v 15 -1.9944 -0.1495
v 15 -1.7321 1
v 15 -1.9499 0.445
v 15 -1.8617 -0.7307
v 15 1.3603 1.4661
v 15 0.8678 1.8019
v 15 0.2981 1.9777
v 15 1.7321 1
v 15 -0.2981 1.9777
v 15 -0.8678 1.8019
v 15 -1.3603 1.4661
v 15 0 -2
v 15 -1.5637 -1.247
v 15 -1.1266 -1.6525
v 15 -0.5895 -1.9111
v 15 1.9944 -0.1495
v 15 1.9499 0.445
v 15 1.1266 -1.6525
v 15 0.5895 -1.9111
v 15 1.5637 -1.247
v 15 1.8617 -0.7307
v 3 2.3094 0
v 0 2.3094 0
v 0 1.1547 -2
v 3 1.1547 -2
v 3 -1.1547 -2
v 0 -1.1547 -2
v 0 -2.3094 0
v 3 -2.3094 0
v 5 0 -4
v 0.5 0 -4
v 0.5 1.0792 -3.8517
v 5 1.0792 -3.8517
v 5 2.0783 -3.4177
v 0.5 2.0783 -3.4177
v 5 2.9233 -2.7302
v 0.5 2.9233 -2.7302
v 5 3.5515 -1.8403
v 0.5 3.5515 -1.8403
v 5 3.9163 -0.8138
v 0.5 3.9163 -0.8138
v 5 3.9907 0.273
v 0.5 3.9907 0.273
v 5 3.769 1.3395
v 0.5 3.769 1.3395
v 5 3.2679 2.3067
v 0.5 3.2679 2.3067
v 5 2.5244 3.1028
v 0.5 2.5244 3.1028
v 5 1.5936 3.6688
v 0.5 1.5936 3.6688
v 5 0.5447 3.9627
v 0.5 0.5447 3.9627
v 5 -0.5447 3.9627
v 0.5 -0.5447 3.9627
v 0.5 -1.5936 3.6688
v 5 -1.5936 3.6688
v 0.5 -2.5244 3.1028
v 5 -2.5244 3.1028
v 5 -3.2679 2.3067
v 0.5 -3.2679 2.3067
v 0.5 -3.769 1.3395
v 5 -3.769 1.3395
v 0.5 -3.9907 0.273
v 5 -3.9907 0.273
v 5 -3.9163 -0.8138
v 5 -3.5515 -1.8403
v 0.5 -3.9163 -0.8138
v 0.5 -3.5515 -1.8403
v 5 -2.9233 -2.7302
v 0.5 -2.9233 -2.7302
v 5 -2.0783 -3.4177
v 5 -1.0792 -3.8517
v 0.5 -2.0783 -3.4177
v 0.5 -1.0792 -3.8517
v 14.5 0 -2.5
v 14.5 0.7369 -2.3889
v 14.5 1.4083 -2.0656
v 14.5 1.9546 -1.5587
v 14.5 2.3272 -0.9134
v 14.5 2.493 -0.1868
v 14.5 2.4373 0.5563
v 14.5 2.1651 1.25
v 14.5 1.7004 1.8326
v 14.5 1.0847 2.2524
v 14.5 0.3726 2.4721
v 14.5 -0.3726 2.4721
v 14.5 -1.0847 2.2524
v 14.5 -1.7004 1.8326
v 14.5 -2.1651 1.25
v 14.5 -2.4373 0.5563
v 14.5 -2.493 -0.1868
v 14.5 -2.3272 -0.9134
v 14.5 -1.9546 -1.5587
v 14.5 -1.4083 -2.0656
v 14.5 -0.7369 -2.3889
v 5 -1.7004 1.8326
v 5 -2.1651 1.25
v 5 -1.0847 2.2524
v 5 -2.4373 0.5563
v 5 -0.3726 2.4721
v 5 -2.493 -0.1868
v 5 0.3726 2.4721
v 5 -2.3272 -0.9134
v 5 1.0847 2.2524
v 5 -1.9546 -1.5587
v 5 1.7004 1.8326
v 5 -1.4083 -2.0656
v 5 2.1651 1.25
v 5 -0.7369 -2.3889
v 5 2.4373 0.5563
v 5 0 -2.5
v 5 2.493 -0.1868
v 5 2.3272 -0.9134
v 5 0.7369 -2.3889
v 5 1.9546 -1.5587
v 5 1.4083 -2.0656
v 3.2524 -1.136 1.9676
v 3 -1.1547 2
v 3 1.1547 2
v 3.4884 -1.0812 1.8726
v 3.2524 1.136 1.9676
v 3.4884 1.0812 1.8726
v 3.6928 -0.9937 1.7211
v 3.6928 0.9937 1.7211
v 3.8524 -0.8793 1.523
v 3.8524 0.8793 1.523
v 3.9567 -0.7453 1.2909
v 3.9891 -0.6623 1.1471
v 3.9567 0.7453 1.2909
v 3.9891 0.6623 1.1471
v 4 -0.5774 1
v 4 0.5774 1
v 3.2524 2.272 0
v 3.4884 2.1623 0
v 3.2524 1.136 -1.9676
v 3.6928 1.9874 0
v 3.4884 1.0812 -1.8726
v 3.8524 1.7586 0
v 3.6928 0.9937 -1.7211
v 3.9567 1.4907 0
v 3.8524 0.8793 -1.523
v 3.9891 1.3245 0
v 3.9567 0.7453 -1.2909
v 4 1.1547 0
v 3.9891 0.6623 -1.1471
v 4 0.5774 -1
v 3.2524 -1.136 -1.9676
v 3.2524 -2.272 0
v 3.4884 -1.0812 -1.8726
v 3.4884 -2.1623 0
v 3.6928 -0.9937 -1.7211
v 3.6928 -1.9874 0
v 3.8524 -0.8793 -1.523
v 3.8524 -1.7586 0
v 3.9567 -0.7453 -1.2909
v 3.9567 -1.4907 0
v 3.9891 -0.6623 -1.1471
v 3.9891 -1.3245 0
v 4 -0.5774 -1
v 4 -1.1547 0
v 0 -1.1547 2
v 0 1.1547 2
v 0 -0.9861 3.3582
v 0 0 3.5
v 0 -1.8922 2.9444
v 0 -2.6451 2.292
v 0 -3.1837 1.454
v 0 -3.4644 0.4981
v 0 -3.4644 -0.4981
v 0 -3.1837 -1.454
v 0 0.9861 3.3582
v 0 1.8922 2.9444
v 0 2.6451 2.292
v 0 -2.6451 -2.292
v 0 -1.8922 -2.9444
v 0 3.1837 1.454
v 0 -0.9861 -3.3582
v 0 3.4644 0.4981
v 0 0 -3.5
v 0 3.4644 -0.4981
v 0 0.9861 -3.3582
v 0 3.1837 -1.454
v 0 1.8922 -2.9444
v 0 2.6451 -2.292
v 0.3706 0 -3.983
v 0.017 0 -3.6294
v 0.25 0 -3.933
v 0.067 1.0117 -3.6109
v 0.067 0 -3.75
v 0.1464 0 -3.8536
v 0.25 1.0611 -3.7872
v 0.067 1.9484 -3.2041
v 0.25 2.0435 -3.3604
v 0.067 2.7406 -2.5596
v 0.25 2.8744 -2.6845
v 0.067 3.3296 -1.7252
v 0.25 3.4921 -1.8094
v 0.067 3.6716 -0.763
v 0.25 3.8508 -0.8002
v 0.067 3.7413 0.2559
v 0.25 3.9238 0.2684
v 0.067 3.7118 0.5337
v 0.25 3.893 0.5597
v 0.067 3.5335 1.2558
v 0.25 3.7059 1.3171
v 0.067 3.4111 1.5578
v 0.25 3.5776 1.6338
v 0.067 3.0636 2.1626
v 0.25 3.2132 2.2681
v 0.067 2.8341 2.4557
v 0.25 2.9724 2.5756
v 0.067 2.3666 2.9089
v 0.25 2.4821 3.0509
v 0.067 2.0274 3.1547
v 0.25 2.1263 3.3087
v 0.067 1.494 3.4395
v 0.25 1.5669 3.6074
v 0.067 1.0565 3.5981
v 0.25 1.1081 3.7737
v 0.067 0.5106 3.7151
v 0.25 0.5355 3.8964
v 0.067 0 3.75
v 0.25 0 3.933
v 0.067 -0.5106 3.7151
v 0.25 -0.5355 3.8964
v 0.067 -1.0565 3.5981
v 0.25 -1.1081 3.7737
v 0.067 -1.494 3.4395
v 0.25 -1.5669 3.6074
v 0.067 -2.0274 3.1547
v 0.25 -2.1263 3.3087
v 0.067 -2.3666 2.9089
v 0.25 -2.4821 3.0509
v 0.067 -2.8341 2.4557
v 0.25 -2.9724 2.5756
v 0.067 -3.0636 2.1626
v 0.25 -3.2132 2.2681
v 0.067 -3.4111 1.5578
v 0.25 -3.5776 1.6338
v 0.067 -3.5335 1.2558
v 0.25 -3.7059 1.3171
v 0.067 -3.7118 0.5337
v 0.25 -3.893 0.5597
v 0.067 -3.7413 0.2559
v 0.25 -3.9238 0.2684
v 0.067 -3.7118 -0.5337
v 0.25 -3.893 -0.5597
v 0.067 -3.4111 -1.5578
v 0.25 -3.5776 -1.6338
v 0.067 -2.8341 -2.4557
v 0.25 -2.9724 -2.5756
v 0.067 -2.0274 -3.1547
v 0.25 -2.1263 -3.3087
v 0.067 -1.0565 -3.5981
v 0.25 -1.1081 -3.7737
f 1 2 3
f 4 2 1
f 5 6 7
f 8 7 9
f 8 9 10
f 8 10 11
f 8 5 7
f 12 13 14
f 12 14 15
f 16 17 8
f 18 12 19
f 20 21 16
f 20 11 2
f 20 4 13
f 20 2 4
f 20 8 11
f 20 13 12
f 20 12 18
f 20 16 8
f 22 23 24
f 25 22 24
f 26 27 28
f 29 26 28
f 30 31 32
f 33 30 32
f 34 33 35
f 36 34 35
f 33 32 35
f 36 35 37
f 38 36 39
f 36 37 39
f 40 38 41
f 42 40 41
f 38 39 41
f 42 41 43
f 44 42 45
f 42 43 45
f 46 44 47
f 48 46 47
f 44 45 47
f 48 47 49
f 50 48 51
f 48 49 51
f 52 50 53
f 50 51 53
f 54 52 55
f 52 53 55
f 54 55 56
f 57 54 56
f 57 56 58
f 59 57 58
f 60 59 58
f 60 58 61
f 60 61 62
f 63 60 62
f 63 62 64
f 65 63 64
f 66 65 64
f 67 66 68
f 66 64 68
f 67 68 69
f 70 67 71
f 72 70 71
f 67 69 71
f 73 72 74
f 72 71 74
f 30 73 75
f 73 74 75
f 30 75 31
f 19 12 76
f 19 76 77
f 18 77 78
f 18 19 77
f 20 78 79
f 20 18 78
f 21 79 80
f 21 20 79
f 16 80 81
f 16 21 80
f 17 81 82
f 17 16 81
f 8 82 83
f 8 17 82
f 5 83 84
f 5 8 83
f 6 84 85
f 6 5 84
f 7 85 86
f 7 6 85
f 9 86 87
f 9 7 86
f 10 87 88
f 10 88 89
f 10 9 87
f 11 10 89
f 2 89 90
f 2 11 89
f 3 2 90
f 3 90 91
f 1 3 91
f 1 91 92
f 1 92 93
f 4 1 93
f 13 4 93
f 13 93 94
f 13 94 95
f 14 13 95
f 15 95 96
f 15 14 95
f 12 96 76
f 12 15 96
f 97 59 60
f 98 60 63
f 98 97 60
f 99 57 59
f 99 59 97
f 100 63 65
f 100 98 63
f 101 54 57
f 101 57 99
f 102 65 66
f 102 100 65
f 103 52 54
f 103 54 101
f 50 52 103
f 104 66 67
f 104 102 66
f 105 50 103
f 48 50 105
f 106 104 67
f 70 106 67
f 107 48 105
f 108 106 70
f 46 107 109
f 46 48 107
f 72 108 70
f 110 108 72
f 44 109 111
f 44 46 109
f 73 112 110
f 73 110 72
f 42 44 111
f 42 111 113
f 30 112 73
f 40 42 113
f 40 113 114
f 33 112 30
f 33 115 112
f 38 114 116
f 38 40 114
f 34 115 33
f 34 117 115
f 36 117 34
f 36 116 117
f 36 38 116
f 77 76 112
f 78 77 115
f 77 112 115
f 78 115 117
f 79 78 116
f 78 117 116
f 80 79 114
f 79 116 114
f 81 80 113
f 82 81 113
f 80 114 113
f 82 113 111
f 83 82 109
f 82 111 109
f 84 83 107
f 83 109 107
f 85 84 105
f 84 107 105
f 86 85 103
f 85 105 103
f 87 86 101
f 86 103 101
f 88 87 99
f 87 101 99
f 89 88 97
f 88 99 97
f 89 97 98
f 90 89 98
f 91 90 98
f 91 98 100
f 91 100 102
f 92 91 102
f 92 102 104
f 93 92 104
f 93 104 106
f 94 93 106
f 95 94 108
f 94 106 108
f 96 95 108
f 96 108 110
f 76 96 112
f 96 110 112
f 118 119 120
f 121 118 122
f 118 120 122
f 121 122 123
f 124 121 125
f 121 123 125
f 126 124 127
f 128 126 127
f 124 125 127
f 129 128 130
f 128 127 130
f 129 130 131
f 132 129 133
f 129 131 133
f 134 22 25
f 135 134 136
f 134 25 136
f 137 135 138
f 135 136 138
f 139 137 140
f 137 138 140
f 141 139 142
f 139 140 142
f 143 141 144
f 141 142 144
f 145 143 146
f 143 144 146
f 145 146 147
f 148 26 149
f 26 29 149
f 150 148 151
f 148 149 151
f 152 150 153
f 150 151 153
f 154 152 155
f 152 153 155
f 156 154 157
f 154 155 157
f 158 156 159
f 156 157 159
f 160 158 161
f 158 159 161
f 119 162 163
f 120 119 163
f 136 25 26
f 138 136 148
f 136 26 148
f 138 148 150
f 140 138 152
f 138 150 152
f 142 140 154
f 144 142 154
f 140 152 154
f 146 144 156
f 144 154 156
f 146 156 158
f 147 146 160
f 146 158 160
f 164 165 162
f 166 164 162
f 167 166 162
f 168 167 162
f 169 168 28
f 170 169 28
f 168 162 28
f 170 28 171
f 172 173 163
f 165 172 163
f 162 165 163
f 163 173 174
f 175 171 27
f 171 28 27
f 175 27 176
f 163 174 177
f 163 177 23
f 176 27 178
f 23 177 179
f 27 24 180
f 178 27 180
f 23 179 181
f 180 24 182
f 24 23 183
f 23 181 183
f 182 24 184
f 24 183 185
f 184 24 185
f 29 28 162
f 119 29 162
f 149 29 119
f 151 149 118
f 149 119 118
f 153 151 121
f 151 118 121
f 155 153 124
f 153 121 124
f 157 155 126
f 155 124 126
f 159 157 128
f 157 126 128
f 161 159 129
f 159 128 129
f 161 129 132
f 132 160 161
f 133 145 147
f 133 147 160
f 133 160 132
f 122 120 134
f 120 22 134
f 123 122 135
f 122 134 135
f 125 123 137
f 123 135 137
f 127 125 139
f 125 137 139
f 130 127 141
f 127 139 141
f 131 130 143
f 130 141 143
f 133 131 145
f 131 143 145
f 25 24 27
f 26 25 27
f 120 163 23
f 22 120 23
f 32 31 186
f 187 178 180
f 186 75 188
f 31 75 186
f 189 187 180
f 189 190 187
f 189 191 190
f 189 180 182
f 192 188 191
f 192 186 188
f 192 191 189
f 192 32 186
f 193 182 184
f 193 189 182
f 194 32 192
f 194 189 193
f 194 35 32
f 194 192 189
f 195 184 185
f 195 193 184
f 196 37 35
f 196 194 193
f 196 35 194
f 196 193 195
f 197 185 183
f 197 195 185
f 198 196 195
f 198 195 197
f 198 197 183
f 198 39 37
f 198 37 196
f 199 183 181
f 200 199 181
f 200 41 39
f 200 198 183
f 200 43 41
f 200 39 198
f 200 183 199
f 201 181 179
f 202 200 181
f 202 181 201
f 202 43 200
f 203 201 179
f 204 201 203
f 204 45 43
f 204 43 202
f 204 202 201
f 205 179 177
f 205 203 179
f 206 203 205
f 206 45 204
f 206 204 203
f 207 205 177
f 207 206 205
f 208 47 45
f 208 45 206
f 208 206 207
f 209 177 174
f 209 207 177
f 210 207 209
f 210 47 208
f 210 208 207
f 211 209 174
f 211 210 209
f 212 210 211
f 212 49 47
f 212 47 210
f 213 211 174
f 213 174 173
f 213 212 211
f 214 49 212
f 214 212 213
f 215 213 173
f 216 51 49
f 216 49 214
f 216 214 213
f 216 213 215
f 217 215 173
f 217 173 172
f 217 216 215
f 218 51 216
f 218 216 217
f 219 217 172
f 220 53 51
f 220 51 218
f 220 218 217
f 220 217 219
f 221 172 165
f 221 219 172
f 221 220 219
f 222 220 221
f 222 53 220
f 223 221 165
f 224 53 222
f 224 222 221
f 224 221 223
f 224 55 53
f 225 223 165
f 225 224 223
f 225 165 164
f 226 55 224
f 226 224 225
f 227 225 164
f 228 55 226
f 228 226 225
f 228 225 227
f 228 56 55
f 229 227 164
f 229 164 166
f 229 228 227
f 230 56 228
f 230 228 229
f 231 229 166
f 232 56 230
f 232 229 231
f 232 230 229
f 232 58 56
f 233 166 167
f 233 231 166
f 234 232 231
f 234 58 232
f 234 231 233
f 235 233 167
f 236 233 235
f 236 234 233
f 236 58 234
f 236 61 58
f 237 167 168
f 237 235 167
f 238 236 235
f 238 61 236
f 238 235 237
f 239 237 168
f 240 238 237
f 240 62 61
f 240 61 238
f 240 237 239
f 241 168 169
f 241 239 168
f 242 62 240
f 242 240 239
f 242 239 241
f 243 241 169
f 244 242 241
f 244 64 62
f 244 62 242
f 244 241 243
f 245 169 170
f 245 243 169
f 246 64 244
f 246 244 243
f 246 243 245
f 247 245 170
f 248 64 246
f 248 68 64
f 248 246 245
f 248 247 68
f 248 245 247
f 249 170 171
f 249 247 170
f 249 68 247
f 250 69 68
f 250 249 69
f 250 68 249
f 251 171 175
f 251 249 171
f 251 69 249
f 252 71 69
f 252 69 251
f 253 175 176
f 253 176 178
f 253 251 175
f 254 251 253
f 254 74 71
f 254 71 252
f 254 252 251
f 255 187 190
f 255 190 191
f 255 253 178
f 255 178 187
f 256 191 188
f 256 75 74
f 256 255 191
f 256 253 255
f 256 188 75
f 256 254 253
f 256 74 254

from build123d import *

# Parameters (mm, degrees)
SKETCH_1_R          = 4
EXTRUDE_1_DEPTH     = 5
SKETCH_2_R          = 2.5
EXTRUDE_2_DEPTH     = 10
CHAMFER_1_SIZE      = 0.5
CUT_EXTRUDE_1_DEPTH = 4
FILLET_1_R          = 1
FILLET_2_R          = 0.5


with BuildPart() as part:
    # Эскиз1 → Вытянуть1 (new body)
    with BuildSketch(Plane(origin=(0, 0, 0), x_dir=(0, 0, -1), z_dir=(1, 0, 0))):
        Circle(SKETCH_1_R)
    extrude(amount=EXTRUDE_1_DEPTH)

    # Эскиз2 → Вытянуть2 (add)
    with BuildSketch(Plane(origin=(5, 0, 0), x_dir=(0, 0, -1), z_dir=(1, 0, 0))):
        Circle(SKETCH_2_R)
    extrude(amount=EXTRUDE_2_DEPTH)

    # Фаска1
    chamfer_1_edges = [part.edges().sort_by_distance(p)[0] for p in [
        (15, 0, 2.5),
    ]]
    chamfer(chamfer_1_edges, length=CHAMFER_1_SIZE)

    # Эскиз3 → Вырез-Вытянуть1 (cut)
    with BuildSketch(Plane.ZY):
        Polygon((0, 2.309401077), (-2, 1.154700538), (-2, -1.154700538), (0, -2.309401077), (2, -1.154700538), (2, 1.154700538), align=None)
    extrude(amount=-CUT_EXTRUDE_1_DEPTH, mode=Mode.SUBTRACT)

    # Скругление1
    fillet_1_edges = [part.edges().sort_by_distance(p)[0] for p in [
        (4, 1.732050808, 1),
        (4, 0, 2),
        (4, -1.732050808, 1),
        (4, -1.732050808, -1),
        (4, 0, -2),
        (4, 1.732050808, -1),
    ]]
    fillet(fillet_1_edges, radius=FILLET_1_R)

    # Скругление2
    fillet_2_edges = [part.edges().sort_by_distance(p)[0] for p in [
        (0, 0, 4),
    ]]
    fillet(fillet_2_edges, radius=FILLET_2_R)


solid = part.part
